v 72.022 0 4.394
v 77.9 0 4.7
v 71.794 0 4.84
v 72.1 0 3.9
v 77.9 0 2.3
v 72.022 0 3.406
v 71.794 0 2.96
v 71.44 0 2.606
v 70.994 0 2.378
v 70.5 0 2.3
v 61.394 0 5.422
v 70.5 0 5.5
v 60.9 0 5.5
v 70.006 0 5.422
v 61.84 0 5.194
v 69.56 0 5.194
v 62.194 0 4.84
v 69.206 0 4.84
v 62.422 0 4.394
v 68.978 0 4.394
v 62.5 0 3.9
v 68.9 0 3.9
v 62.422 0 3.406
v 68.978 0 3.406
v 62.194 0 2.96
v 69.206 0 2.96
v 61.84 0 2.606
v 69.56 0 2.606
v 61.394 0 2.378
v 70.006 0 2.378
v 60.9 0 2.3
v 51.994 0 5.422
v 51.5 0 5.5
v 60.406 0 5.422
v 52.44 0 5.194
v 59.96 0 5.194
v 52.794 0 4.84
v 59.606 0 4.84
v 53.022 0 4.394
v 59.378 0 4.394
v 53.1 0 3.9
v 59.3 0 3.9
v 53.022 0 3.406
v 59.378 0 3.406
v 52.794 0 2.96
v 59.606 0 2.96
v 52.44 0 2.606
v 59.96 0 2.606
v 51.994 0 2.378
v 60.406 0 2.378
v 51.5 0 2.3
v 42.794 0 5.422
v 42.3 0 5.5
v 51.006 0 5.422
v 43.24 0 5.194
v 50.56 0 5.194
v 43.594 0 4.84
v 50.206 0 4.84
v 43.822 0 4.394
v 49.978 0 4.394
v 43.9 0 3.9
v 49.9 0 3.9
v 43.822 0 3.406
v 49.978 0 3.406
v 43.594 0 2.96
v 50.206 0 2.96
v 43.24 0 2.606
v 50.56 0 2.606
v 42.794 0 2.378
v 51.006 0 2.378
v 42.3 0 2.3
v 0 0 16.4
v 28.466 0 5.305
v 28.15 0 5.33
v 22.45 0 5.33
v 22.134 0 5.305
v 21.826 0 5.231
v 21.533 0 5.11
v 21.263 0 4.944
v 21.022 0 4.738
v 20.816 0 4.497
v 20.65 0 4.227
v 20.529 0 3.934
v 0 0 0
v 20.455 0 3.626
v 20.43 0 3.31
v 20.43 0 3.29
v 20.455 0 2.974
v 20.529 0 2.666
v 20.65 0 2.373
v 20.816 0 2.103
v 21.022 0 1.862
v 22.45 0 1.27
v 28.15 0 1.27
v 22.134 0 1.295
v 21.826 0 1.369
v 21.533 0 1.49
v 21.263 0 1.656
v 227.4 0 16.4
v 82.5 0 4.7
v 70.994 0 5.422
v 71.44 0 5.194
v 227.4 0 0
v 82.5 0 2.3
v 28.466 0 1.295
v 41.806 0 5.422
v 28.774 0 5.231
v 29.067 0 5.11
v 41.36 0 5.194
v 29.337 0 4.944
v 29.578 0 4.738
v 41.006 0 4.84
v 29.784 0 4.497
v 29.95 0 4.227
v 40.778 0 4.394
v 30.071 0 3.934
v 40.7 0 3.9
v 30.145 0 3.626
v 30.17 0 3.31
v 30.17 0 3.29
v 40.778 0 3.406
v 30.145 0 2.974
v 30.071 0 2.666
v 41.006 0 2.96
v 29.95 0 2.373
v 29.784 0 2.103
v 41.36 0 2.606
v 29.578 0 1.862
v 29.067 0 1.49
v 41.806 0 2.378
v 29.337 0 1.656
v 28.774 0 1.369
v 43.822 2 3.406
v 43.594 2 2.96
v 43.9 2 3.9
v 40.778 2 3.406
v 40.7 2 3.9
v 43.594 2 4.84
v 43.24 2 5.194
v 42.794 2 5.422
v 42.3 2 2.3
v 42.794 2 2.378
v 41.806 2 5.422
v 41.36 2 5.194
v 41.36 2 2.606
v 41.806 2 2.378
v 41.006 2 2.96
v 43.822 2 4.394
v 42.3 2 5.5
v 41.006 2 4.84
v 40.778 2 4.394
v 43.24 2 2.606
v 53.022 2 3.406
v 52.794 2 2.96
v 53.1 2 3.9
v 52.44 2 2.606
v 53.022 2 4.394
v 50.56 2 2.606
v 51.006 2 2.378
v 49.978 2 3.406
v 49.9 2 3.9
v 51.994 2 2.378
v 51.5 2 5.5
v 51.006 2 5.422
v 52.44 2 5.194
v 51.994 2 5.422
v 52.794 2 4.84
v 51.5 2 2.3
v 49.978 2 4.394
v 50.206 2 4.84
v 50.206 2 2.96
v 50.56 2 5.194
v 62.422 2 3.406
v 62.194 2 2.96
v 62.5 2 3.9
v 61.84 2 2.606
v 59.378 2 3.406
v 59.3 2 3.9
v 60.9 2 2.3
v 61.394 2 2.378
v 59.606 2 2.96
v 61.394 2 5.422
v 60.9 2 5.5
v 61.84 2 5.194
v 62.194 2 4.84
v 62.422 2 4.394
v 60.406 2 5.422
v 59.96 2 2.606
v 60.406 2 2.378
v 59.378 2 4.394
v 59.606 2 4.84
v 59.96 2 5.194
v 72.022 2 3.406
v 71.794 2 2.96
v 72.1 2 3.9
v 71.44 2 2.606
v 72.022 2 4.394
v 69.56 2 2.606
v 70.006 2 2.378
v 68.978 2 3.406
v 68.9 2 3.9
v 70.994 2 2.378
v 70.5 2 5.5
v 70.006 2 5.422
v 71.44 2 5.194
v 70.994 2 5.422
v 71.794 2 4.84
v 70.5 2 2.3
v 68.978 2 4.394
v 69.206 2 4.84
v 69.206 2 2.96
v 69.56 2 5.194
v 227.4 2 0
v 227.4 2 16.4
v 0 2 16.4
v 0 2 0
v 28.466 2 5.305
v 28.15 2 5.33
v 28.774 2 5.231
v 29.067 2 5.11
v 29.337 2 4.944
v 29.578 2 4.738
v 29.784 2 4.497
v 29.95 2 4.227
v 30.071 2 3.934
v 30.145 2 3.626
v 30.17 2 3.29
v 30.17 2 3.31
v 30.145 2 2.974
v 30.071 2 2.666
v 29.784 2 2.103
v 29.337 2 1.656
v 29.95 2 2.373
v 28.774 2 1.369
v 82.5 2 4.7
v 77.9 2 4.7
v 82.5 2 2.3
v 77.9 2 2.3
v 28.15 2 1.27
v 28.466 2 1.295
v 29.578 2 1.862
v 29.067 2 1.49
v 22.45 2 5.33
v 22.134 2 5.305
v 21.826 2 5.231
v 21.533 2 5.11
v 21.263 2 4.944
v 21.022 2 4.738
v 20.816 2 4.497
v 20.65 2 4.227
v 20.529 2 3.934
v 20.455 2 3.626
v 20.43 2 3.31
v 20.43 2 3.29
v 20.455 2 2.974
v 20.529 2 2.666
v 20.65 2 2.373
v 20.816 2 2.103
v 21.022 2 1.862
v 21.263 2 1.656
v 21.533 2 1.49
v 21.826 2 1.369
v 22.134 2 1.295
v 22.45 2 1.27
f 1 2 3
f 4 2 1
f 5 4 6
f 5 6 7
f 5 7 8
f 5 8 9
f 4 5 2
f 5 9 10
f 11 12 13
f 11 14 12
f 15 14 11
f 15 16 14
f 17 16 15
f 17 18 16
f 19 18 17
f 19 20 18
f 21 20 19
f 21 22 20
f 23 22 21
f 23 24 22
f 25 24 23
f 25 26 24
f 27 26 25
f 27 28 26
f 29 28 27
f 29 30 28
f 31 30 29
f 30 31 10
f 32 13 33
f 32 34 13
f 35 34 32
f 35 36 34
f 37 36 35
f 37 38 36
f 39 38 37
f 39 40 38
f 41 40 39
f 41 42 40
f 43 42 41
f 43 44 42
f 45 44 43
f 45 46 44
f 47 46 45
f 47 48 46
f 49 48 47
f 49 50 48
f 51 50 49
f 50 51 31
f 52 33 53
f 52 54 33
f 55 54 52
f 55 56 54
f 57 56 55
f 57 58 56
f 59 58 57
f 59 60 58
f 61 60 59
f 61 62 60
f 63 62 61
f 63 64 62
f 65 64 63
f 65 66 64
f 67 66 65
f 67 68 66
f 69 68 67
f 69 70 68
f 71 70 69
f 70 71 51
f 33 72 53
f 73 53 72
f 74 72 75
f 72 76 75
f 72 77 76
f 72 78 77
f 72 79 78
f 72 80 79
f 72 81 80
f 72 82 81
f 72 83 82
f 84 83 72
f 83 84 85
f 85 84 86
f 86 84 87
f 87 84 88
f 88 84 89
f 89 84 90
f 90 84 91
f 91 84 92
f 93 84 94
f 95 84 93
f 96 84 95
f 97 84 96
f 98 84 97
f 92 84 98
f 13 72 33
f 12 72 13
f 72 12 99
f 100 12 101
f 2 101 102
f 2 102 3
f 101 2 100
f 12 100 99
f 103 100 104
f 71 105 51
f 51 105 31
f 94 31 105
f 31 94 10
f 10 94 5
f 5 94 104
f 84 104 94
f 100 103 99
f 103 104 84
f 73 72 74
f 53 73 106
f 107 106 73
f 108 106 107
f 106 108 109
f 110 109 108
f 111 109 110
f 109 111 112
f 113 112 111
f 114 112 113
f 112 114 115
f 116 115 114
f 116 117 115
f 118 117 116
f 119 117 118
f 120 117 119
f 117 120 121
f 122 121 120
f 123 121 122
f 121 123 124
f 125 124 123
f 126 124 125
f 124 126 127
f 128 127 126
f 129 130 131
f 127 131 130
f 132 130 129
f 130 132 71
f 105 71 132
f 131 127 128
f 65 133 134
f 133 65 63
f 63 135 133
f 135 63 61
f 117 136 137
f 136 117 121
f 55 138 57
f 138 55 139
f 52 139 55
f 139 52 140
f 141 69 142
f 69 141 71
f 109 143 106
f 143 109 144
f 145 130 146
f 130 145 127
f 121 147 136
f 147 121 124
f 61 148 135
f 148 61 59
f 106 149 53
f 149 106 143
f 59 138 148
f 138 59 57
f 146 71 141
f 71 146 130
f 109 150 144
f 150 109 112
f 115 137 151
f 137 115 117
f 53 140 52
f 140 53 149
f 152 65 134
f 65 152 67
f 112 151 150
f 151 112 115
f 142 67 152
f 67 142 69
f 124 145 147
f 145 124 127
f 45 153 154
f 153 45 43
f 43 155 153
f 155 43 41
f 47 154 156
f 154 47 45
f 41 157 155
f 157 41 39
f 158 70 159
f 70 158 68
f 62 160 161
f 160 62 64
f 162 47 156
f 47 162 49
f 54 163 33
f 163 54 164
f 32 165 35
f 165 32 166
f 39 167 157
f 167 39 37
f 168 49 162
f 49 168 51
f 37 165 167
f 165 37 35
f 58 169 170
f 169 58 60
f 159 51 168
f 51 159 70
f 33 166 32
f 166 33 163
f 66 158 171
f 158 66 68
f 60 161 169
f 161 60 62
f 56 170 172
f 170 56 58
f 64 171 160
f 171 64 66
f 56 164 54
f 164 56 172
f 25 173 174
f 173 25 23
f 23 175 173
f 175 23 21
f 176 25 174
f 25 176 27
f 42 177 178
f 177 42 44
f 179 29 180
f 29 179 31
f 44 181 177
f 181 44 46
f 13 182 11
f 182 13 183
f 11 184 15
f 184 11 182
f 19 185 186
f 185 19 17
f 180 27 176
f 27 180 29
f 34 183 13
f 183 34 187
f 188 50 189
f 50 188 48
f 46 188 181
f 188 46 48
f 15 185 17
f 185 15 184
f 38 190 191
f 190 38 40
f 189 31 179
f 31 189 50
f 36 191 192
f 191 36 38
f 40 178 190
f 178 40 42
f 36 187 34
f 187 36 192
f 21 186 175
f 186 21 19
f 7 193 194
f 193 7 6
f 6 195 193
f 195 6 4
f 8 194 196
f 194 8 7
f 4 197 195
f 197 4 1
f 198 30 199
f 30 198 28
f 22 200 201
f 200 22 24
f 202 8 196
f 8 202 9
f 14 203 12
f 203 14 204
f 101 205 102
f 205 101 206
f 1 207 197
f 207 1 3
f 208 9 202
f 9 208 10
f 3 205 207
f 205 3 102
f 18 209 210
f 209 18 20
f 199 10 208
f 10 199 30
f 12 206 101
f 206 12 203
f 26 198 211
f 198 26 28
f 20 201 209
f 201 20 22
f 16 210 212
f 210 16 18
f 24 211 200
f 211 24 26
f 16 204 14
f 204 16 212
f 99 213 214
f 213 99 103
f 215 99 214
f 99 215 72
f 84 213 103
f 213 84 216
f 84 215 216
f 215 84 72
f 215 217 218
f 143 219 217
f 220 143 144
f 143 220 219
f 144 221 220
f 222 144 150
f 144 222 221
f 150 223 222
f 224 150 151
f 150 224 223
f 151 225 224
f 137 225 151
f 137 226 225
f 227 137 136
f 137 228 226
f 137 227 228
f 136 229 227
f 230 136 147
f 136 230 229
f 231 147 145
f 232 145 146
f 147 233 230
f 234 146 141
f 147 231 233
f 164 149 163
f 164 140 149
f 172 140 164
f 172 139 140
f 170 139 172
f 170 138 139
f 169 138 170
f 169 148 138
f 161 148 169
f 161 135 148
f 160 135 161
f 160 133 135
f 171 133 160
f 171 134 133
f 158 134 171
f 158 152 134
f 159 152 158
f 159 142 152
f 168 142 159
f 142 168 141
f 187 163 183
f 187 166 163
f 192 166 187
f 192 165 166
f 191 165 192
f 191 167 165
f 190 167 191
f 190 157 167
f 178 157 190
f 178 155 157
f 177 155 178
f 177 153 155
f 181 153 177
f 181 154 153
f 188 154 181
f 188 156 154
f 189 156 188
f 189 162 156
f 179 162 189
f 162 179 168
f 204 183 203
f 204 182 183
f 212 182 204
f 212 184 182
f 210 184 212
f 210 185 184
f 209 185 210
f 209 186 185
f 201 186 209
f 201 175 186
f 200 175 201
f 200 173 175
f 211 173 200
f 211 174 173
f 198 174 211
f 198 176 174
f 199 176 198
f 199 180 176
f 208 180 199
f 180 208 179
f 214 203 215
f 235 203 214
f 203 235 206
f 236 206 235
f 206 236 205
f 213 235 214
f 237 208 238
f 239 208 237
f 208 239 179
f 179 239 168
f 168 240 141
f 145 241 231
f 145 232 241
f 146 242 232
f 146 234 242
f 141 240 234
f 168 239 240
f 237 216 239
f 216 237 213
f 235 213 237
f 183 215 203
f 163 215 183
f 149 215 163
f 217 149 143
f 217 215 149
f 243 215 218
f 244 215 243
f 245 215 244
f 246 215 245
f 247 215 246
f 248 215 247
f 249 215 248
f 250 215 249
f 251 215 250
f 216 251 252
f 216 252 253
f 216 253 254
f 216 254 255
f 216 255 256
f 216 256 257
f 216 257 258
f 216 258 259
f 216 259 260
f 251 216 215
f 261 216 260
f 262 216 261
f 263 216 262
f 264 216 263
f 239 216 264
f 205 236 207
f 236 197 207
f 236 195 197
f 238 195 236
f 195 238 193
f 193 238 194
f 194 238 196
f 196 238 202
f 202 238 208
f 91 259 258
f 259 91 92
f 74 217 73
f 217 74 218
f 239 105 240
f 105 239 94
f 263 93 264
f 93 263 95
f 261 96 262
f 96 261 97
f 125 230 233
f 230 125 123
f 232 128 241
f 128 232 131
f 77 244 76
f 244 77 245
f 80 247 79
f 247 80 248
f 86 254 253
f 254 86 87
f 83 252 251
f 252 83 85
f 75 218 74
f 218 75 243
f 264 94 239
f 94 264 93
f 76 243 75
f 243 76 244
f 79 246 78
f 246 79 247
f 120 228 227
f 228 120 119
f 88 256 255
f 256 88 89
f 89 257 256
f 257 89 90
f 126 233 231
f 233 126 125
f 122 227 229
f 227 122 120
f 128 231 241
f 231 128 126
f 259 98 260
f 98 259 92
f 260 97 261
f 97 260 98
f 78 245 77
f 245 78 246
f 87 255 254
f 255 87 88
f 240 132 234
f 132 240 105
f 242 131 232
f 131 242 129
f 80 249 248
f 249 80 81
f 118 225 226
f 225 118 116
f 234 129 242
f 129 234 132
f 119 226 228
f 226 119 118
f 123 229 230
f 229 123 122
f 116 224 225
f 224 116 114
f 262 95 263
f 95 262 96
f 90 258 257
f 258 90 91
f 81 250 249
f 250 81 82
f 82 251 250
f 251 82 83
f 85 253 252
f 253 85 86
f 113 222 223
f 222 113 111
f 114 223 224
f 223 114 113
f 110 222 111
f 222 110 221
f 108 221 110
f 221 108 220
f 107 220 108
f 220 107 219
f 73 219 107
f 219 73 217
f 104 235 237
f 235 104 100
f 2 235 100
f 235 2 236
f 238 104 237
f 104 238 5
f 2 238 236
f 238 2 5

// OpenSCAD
// ============================================================
// Base Back Wall - separate piece, slides into base from above
//
// Contains USB-C port, button holes, and on/off switch slot.
// Fits between the left and right base walls.
//
// Board is flipped (components face down), back edge faces this wall:
//   LEFT → [USB-C] [btn1] [btn2] [btn3] [reset] [off/on] → RIGHT
// ============================================================
include <common.scad>

module base_back_wall() {
    compartment_h = max(board_clearance + board_d, battery_d) + 5;
    base_h = base_wall + compartment_h;
    left_ext = panel_rim + panel_inset;
    base_w = frame_w;

    // Wall dimensions: fits between left and right inner walls
    wall_w = base_w - 2 * base_wall - 2 * tol;
    wall_h = base_h - base_wall - tol;  // sits on floor, up to top
    wall_d = base_wall;

    board_x = left_ext + base_wall;
    board_y = 20 - board_hole_edge_y;
    standoff_h = 6.2;

    e = 0.01;
    hole_tol = 0.8;

    // Board X in wall coords (wall starts at base_wall + tol from base left)
    bx_offset = board_x - base_wall - tol;

    left_hole_from_edge = board_hole_edge_x;
    usb_x   = left_hole_from_edge + 11.8;
    btn1_x  = left_hole_from_edge + 28.8;
    btn2_x  = left_hole_from_edge + 38;
    btn3_x  = left_hole_from_edge + 47.4;
    reset_x = left_hole_from_edge + 57;
    sw_off_x = left_hole_from_edge + 65.6;
    sw_on_x  = left_hole_from_edge + 67.8;
    sw_center_x = (sw_off_x + sw_on_x) / 2;

    // Z positions in wall coords (wall bottom = base floor + base_wall)
    board_surface_z = standoff_h;  // relative to wall bottom
    usb_z    = board_surface_z - 2.9;
    btn_z    = board_surface_z - 2.3;
    switch_z = board_surface_z - 2.7;

    usb_port_w = 8.94 + hole_tol;
    usb_port_h = 3.26 + hole_tol;
    usb_port_r = usb_port_h / 2 - 0.01;

    sw_dial = 1.6 + hole_tol;
    sw_travel = sw_on_x - sw_off_x;
    sw_slot_w = sw_travel + sw_dial;
    sw_slot_h = sw_dial;

    btn_hole_d = 2.4 + hole_tol;

    difference() {
        cube([wall_w, wall_d, wall_h]);

        // USB-C port (rounded rectangle)
        translate([bx_offset + usb_x, 0, usb_z])
            rotate([-90, 0, 0])
                linear_extrude(wall_d + e)
                    offset(r = usb_port_r, $fn = 40)
                        offset(r = -usb_port_r)
                            square([usb_port_w, usb_port_h], center = true);

        // Button holes
        button_xs = [btn1_x, btn2_x, btn3_x, reset_x];
        for (bx = button_xs) {
            translate([bx_offset + bx, 0, btn_z])
                rotate([-90, 0, 0])
                    cylinder(d = btn_hole_d, h = wall_d + e, $fn = 20);
        }

        // On/off switch slot
        translate([bx_offset + sw_center_x - sw_slot_w / 2, 0, switch_z - sw_slot_h / 2])
            cube([sw_slot_w, wall_d + e, sw_slot_h]);
    }
}

base_back_wall();
